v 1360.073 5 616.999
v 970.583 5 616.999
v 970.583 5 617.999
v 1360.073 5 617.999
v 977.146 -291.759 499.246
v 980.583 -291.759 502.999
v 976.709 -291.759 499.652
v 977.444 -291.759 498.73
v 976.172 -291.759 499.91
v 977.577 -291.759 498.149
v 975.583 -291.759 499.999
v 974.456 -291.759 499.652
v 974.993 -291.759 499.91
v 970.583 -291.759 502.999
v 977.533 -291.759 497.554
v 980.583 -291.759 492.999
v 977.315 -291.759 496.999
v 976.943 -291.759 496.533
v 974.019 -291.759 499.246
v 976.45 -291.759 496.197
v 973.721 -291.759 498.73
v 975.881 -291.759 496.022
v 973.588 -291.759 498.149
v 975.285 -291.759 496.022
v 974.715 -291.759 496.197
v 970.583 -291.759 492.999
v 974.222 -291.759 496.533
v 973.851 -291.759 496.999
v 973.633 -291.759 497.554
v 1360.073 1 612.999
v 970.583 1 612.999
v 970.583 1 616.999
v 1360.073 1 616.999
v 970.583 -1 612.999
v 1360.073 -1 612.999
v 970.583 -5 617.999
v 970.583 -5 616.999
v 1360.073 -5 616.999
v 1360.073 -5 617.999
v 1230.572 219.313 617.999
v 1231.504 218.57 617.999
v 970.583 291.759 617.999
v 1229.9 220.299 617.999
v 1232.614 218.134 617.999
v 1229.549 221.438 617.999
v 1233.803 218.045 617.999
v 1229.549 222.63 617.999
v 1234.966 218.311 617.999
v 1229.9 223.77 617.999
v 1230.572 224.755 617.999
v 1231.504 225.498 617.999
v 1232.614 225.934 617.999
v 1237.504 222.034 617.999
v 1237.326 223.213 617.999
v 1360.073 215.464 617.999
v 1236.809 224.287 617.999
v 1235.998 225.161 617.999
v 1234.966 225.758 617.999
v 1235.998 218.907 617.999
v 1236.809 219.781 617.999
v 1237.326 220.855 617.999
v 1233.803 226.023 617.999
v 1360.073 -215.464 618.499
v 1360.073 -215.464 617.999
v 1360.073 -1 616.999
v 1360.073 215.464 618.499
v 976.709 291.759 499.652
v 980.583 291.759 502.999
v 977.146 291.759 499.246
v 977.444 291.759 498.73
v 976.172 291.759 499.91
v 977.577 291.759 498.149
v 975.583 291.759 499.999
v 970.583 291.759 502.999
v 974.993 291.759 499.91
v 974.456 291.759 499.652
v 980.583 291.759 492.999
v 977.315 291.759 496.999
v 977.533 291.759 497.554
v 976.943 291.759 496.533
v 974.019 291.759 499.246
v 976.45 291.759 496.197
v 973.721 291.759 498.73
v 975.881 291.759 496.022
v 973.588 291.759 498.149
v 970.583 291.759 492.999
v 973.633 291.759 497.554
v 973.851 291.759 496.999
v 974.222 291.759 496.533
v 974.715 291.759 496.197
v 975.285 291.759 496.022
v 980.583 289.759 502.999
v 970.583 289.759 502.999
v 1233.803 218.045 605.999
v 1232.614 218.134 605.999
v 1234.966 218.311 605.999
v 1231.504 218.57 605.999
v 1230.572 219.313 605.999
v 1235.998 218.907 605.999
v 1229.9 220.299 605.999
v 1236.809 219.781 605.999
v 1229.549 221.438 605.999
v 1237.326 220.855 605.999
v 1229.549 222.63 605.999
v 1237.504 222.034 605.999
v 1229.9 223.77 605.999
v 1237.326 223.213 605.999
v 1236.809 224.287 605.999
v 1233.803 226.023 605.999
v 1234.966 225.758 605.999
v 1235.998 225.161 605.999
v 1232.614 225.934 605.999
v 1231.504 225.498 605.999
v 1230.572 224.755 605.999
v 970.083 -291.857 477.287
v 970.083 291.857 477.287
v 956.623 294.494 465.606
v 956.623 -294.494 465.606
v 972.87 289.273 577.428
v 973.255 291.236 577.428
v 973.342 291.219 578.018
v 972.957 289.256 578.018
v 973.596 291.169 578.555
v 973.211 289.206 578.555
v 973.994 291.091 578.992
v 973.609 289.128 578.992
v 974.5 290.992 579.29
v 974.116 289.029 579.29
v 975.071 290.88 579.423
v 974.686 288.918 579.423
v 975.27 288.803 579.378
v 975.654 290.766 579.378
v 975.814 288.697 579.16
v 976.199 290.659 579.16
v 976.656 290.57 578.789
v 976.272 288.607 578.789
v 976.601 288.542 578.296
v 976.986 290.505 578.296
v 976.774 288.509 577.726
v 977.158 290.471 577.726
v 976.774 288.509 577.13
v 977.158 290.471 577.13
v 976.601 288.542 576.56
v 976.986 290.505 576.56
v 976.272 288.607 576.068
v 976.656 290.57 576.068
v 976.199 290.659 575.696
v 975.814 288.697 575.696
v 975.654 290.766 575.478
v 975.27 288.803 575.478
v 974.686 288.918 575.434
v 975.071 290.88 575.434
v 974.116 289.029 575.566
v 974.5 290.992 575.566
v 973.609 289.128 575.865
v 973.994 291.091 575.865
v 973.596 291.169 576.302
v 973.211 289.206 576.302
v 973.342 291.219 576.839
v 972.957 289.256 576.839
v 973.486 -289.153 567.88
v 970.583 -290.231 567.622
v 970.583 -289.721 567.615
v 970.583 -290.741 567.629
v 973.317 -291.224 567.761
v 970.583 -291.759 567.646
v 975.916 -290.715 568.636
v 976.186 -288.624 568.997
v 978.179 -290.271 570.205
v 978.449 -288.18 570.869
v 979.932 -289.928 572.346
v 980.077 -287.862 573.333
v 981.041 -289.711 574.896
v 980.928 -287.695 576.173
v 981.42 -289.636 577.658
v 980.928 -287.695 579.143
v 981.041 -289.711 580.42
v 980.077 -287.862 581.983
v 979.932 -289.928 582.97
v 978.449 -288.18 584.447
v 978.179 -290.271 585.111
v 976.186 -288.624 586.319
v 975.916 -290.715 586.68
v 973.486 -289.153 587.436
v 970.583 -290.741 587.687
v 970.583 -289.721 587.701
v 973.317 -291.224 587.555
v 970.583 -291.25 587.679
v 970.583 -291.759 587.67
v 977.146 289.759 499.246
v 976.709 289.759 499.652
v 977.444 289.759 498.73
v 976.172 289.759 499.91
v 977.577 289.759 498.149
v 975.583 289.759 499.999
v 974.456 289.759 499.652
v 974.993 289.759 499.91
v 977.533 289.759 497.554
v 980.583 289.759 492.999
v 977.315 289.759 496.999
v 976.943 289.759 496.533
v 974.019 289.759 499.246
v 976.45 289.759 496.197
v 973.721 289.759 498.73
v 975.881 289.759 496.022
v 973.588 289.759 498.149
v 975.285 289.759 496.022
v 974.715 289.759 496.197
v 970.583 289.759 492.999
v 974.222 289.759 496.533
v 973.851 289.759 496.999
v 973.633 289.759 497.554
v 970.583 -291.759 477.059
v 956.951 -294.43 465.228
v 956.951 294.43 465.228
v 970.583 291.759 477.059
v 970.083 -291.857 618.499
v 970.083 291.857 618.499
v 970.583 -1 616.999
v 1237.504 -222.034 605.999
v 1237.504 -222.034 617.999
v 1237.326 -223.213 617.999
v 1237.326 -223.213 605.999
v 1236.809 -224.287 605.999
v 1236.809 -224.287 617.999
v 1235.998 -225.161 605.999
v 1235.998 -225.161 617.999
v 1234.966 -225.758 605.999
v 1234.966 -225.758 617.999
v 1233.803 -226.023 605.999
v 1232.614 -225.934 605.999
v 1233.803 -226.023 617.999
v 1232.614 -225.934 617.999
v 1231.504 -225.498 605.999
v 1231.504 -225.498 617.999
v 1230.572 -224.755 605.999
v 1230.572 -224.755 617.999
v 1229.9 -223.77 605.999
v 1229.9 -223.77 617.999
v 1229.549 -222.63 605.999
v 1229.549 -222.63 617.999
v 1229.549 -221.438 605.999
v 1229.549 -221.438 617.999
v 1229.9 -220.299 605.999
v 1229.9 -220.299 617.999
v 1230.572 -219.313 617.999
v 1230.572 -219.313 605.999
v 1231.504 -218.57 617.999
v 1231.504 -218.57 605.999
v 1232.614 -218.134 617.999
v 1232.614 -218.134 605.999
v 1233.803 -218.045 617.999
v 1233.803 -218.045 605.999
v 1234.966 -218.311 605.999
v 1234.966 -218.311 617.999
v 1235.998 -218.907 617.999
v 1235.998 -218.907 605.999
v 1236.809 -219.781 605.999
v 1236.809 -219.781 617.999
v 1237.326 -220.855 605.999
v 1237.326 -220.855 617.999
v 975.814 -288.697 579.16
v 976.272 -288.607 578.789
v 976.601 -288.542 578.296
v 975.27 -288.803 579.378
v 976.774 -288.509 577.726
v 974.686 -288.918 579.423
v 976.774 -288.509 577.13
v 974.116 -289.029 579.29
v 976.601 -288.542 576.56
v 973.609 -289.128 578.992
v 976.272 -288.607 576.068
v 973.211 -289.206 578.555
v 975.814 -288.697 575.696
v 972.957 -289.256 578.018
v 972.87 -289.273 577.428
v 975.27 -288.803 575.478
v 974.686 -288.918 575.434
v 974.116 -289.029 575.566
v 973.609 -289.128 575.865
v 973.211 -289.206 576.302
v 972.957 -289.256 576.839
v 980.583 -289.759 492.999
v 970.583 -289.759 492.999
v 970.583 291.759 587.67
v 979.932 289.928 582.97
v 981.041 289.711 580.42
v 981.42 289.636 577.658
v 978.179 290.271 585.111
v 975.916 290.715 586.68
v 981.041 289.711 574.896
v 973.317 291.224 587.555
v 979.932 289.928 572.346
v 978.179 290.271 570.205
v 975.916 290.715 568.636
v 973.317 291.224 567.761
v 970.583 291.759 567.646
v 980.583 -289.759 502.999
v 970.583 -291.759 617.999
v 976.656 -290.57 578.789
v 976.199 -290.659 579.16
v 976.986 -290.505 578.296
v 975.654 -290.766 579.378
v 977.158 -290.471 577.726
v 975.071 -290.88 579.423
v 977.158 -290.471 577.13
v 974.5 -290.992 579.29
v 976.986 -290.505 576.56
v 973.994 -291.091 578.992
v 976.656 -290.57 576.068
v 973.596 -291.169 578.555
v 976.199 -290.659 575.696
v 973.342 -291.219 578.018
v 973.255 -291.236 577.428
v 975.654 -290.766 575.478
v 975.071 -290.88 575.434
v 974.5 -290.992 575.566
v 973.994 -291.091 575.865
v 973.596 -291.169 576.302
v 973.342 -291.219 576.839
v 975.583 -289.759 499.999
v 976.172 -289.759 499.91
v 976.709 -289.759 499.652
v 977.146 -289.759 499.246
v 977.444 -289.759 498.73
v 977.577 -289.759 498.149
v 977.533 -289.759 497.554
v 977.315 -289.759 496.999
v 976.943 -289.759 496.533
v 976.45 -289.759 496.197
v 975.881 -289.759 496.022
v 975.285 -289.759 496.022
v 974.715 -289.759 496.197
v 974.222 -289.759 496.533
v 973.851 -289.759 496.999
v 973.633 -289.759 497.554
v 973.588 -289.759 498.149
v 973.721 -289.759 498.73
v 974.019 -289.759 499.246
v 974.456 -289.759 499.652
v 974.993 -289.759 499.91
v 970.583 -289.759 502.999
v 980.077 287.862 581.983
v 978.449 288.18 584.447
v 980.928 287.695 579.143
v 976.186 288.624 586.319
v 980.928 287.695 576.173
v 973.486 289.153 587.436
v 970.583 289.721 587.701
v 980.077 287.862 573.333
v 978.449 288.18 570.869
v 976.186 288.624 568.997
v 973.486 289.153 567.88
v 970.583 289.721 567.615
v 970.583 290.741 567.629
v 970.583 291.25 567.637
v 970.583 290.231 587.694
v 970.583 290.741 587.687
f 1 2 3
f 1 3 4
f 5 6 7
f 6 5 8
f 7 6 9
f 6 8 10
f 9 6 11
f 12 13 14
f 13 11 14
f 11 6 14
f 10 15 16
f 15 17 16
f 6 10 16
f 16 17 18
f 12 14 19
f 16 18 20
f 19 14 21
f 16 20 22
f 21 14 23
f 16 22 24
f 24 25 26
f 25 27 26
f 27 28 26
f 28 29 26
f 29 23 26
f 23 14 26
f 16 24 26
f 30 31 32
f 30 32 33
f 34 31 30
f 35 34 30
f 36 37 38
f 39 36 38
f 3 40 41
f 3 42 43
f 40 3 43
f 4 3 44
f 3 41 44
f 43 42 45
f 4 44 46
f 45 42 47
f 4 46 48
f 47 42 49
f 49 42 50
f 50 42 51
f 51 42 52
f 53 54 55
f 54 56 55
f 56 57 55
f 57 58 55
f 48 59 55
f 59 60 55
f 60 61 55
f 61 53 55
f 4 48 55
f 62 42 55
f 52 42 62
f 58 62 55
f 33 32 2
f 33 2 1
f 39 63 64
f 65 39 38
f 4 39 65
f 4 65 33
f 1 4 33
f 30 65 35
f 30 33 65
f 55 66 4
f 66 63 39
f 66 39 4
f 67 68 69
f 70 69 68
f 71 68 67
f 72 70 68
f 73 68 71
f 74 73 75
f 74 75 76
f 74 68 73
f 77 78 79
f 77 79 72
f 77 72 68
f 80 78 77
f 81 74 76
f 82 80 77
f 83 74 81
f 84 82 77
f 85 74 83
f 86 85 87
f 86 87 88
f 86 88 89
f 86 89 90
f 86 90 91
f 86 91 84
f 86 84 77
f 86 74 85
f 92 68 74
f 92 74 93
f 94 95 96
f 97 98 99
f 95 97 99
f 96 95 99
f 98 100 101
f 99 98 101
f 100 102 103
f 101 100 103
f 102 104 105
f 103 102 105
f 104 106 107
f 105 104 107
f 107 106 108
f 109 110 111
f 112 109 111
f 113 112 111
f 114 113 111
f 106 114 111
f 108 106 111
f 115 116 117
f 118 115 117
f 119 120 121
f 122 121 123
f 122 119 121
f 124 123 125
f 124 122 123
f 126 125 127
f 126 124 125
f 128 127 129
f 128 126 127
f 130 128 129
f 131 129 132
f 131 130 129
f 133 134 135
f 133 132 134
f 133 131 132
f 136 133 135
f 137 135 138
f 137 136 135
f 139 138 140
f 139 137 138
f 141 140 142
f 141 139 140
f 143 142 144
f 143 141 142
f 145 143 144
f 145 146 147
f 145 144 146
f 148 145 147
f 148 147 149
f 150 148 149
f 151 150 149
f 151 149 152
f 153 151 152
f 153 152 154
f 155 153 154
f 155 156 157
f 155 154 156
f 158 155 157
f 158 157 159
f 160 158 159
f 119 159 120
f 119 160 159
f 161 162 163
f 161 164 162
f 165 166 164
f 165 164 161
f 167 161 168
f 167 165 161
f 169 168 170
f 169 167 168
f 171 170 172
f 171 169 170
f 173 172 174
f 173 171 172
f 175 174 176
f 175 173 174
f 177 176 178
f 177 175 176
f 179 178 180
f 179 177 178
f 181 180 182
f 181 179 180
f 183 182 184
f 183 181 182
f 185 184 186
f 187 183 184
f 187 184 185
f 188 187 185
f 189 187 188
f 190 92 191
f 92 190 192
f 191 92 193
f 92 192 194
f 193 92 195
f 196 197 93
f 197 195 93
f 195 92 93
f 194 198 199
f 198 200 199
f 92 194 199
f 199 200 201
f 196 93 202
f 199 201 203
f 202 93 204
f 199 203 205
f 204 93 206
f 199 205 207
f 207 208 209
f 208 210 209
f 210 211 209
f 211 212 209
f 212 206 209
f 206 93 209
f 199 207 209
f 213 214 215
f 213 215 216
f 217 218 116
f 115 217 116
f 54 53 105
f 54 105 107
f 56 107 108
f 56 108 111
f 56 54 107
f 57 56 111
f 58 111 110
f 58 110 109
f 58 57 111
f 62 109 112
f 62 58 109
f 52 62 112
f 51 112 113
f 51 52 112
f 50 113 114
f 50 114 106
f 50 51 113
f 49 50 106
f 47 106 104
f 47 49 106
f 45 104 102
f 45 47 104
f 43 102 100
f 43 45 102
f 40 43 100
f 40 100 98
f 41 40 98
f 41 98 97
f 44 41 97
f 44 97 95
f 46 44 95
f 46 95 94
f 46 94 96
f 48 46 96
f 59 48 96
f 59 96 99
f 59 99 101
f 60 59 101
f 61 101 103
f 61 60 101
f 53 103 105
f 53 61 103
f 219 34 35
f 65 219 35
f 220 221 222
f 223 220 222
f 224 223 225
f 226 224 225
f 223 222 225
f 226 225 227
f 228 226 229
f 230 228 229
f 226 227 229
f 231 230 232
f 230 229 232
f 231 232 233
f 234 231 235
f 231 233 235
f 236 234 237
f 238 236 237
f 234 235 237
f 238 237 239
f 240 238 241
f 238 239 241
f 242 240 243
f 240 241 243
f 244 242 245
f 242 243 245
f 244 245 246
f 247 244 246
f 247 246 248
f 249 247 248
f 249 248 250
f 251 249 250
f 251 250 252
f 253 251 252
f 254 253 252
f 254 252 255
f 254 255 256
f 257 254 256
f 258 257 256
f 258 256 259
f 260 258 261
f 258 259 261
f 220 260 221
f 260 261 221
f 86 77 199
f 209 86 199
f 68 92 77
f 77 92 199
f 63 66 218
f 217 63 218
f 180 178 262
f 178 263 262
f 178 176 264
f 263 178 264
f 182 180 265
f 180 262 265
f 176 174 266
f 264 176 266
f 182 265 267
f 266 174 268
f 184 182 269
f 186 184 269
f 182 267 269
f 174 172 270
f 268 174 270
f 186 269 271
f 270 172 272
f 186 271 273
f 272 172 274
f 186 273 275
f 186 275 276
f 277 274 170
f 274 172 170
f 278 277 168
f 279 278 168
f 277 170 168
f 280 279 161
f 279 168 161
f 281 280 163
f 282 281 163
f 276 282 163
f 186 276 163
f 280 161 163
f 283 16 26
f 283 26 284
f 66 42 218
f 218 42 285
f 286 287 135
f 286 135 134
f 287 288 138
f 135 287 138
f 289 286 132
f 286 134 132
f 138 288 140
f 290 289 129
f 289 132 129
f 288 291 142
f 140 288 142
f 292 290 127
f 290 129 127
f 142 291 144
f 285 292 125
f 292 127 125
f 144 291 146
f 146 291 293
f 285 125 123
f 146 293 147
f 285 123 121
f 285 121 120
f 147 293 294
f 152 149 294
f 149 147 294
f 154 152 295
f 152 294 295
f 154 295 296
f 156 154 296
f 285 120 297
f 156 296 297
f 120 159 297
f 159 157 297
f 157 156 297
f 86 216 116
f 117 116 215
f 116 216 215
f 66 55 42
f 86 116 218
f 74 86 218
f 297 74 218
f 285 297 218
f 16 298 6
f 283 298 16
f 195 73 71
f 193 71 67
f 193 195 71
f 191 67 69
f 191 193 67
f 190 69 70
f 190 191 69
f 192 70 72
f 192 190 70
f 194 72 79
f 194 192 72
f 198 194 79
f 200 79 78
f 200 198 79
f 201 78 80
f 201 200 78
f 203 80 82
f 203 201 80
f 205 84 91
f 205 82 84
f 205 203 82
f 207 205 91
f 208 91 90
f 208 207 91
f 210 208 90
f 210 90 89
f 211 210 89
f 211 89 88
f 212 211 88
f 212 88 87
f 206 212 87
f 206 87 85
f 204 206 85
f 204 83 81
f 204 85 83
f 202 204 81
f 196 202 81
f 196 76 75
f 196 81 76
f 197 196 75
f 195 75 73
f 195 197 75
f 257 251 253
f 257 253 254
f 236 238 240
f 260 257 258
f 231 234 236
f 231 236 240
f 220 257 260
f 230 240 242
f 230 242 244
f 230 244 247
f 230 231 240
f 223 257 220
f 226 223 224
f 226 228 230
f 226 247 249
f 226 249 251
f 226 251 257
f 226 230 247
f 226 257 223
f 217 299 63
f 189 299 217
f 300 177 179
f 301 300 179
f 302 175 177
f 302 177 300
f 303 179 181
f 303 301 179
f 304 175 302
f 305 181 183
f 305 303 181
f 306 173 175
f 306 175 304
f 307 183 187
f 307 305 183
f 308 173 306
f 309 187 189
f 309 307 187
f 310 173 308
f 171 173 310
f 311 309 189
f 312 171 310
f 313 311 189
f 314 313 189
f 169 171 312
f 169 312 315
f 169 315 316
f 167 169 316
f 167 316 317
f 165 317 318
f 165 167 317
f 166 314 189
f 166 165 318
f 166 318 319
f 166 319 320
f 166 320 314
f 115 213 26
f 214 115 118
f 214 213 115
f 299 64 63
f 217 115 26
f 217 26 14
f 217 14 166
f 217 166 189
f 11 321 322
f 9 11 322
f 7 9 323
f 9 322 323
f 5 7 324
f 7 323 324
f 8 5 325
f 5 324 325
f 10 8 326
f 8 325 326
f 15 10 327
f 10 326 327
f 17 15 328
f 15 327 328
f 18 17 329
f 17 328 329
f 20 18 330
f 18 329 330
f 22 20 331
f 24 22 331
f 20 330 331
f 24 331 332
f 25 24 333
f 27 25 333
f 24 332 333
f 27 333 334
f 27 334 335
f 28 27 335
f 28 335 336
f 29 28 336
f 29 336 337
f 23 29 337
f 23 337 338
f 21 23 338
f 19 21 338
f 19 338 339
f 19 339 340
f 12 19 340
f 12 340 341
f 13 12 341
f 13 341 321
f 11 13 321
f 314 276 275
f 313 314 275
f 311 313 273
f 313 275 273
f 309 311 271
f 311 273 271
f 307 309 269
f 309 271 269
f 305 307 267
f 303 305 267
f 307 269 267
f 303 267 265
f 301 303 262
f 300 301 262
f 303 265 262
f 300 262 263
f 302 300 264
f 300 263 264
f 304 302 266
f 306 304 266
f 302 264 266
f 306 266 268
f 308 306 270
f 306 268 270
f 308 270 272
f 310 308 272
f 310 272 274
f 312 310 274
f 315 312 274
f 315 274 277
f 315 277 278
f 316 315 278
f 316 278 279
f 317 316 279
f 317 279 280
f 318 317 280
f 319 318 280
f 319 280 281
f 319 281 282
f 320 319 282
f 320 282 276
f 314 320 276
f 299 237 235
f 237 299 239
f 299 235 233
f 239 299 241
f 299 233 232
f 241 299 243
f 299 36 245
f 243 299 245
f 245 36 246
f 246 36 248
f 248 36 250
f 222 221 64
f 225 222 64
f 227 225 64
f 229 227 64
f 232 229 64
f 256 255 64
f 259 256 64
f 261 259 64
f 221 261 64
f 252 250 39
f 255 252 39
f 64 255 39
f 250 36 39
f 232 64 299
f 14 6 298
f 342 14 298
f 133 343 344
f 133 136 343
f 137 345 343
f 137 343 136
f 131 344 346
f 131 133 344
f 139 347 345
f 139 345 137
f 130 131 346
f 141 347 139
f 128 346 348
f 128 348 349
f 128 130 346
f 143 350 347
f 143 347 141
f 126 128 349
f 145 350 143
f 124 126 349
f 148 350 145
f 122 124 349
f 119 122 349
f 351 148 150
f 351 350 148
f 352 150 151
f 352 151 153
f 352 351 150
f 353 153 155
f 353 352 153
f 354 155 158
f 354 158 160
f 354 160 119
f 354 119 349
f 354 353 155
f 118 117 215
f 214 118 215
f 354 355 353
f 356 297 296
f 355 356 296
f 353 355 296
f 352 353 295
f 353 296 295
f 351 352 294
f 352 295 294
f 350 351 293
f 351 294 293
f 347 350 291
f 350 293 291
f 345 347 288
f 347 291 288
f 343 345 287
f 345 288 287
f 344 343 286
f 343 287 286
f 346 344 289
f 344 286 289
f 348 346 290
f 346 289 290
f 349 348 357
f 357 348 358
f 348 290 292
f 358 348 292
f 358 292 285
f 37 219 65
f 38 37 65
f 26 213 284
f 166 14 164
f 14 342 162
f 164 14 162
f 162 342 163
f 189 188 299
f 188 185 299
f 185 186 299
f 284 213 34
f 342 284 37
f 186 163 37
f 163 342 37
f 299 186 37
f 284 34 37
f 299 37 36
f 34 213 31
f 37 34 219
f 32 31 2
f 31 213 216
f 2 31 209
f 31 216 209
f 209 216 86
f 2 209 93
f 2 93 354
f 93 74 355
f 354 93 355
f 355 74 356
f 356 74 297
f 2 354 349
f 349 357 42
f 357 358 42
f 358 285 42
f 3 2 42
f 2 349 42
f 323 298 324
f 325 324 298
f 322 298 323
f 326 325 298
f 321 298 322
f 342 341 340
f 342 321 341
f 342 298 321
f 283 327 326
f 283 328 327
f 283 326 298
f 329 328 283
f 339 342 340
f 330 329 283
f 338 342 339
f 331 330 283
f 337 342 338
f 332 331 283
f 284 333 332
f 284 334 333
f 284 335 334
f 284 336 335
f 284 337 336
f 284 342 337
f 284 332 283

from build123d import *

# Parameters (mm, degrees)
WYCI_GNI_CIE_CIENKA_CIANKA1_DEPTH      = 400
WYCI_GNI_CIE_CIENKA_CIANKA1_DEPTH_BACK = 400
DODANIE_WYCI_GNI_CIE2_DEPTH            = 2
SZKIC6_W                               = 389.49
SZKIC6_H                               = 5
WYCI_GNI_CIE_CIENKA_CIANKA2_DEPTH      = 1
WYCI_GNI_CIE_CIENKA_CIANKA2_DEPTH_BACK = 1
SZKIC6_2_W                             = 389.49
SZKIC6_2_H                             = 1
WYCI_GNI_CIE_CIENKA_CIANKA3_DEPTH      = 5
WYCI_GNI_CIE_CIENKA_CIANKA3_DEPTH_BACK = 5
SZKIC7_R                               = 2
WYTNIJ_WYCI_GNI_CIE1_DEPTH             = 10
SZKIC9_W                               = 10
SZKIC9_H                               = 2
WYCI_GNI_CIE_CIENKA_CIANKA4_DEPTH      = 10
SZKIC10_R                              = 2
WYTNIJ_WYCI_GNI_CIE2_DEPTH             = 10
SKETCH1_R                              = 4
BOSS_EXTRUDE1_DEPTH                    = 12


with BuildPart() as part:
    # Szkic1 → Wyci_gni_cie-cienka _cianka1 (new, two sides)
    with BuildSketch(Plane(origin=(0, 0, 0), x_dir=(1, 0, 0), z_dir=(0, 1, 0))) as wyci_gni_cie_cienka_cianka1_sk:
        Polygon((956.950680953, -465.228422764), (970.58269303, -477.059346089), (970.58269303, -617.999346089), (1360.07269303, -617.999346089), (1360.07269303, -618.499346089), (970.08269303, -618.499346089), (970.08269303, -477.287451692), (956.622954545, -465.606040827), align=None)
    extrude(amount=WYCI_GNI_CIE_CIENKA_CIANKA1_DEPTH)
    extrude(wyci_gni_cie_cienka_cianka1_sk.sketch, amount=-WYCI_GNI_CIE_CIENKA_CIANKA1_DEPTH_BACK)

    # Ci_cie powierzchni_1
    split(bisect_by=Plane(origin=(90.906039695, 464.075841363, 0), x_dir=(-0.9813493581662637, 0.19223276834780917, 0), z_dir=(0.19223276834780917, 0.9813493581662637, 0)), keep=Keep.BOTTOM)

    # Ci_cie powierzchni_2
    split(bisect_by=Plane(origin=(90.906039695, -464.075841363, 0), x_dir=(-0.9813493581662637, -0.19223276834780917, 0), z_dir=(-0.19223276834780917, 0.9813493581662637, 0)), keep=Keep.TOP)

    # Szkic4 → Dodanie-wyci_gni_cie2 (add)
    with BuildSketch(Plane(origin=(90.906039695, -464.075841363, 0), x_dir=(-0.9813493581662637, -0.19223276834780914, 0), z_dir=(0.19223276834780914, -0.9813493581662637, 0))):
        with BuildLine():
            Line((-896.394995334, -587.669895838), (-896.394995334, -567.646267832))
            ThreePointArc((-896.394995334, -567.646267832), (-907.43844862, -577.658081835), (-896.394995334, -587.669895838))
        make_face()
    dodanie_wyci_gni_cie2 = extrude(amount=-DODANIE_WYCI_GNI_CIE2_DEPTH)

    # Szkic6 → Wyci_gni_cie-cienka _cianka2 (add, two sides)
    with BuildSketch(Plane(origin=(0, 0, 0), x_dir=(1, 0, 0), z_dir=(0, 1, 0))) as wyci_gni_cie_cienka_cianka2_sk:
        with Locations((1165.32769303, -615.499346089)):
            Rectangle(SZKIC6_W, SZKIC6_H)
    extrude(amount=WYCI_GNI_CIE_CIENKA_CIANKA2_DEPTH)
    extrude(wyci_gni_cie_cienka_cianka2_sk.sketch, amount=-WYCI_GNI_CIE_CIENKA_CIANKA2_DEPTH_BACK)

    # Szkic6_2 → Wyci_gni_cie-cienka _cianka3 (add, two sides)
    with BuildSketch(Plane(origin=(0, 0, 0), x_dir=(1, 0, 0), z_dir=(0, 1, 0))) as wyci_gni_cie_cienka_cianka3_sk:
        with Locations((1165.32769303, -617.499346089)):
            Rectangle(SZKIC6_2_W, SZKIC6_2_H)
    extrude(amount=WYCI_GNI_CIE_CIENKA_CIANKA3_DEPTH)
    extrude(wyci_gni_cie_cienka_cianka3_sk.sketch, amount=-WYCI_GNI_CIE_CIENKA_CIANKA3_DEPTH_BACK)

    # Szkic7 → Wytnij-wyci_gni_cie1 (cut)
    with BuildSketch(Plane(origin=(90.521574159, -462.113142647, 0), x_dir=(0.9813493581662637, 0.19223276834780917, 0), z_dir=(-0.19223276834780914, 0.9813493581662636, 0))):
        with Locations(Location((901.117736464, -577.428231407, 0), (0, 0, 180))):
            Circle(SZKIC7_R)
    wytnij_wyci_gni_cie1 = extrude(amount=-WYTNIJ_WYCI_GNI_CIE1_DEPTH, mode=Mode.SUBTRACT)

    # Lustro1: Dodanie-wyci_gni_cie2, Wytnij-wyci_gni_cie1 across plane
    add(dodanie_wyci_gni_cie2.mirror(Plane.ZX))
    add(wytnij_wyci_gni_cie1.mirror(Plane.ZX), mode=Mode.SUBTRACT)

    # Szkic9 → Wyci_gni_cie-cienka _cianka4 (add)
    with BuildSketch(Plane(origin=(970.58269303, 0, 0), x_dir=(0, 0, -1), z_dir=(1, 0, 0))):
        with Locations((-497.999346089, -290.759349877)):
            Rectangle(SZKIC9_W, SZKIC9_H)
    wyci_gni_cie_cienka_cianka4 = extrude(amount=WYCI_GNI_CIE_CIENKA_CIANKA4_DEPTH)

    # Szkic10 → Wytnij-wyci_gni_cie2 (cut)
    with BuildSketch(Plane(origin=(0, -289.759349877, 0), x_dir=(1, 0, 0), z_dir=(0, 1, 0))):
        with Locations(Location((975.58269303, -497.999346089, 0), (0, 0, 270))):
            Circle(SZKIC10_R)
    wytnij_wyci_gni_cie2 = extrude(amount=-WYTNIJ_WYCI_GNI_CIE2_DEPTH, mode=Mode.SUBTRACT)

    # Sketch1 → Boss-Extrude1 (add)
    with BuildSketch(Plane(origin=(0, 0, 617.999346089), x_dir=(-1, 0, 0), z_dir=(0, 0, -1))):
        with Locations(Location((-1233.504191335, -222.034079566, 0), (0, 0, 180))):
            Circle(SKETCH1_R)
    boss_extrude1 = extrude(amount=BOSS_EXTRUDE1_DEPTH)

    # Lustro2: Wyci_gni_cie-cienka _cianka4, Wytnij-wyci_gni_cie2, Boss-Extrude1 across plane
    add(wyci_gni_cie_cienka_cianka4.mirror(Plane.ZX))
    add(wytnij_wyci_gni_cie2.mirror(Plane.ZX), mode=Mode.SUBTRACT)
    add(boss_extrude1.mirror(Plane.ZX))


solid = part.part
